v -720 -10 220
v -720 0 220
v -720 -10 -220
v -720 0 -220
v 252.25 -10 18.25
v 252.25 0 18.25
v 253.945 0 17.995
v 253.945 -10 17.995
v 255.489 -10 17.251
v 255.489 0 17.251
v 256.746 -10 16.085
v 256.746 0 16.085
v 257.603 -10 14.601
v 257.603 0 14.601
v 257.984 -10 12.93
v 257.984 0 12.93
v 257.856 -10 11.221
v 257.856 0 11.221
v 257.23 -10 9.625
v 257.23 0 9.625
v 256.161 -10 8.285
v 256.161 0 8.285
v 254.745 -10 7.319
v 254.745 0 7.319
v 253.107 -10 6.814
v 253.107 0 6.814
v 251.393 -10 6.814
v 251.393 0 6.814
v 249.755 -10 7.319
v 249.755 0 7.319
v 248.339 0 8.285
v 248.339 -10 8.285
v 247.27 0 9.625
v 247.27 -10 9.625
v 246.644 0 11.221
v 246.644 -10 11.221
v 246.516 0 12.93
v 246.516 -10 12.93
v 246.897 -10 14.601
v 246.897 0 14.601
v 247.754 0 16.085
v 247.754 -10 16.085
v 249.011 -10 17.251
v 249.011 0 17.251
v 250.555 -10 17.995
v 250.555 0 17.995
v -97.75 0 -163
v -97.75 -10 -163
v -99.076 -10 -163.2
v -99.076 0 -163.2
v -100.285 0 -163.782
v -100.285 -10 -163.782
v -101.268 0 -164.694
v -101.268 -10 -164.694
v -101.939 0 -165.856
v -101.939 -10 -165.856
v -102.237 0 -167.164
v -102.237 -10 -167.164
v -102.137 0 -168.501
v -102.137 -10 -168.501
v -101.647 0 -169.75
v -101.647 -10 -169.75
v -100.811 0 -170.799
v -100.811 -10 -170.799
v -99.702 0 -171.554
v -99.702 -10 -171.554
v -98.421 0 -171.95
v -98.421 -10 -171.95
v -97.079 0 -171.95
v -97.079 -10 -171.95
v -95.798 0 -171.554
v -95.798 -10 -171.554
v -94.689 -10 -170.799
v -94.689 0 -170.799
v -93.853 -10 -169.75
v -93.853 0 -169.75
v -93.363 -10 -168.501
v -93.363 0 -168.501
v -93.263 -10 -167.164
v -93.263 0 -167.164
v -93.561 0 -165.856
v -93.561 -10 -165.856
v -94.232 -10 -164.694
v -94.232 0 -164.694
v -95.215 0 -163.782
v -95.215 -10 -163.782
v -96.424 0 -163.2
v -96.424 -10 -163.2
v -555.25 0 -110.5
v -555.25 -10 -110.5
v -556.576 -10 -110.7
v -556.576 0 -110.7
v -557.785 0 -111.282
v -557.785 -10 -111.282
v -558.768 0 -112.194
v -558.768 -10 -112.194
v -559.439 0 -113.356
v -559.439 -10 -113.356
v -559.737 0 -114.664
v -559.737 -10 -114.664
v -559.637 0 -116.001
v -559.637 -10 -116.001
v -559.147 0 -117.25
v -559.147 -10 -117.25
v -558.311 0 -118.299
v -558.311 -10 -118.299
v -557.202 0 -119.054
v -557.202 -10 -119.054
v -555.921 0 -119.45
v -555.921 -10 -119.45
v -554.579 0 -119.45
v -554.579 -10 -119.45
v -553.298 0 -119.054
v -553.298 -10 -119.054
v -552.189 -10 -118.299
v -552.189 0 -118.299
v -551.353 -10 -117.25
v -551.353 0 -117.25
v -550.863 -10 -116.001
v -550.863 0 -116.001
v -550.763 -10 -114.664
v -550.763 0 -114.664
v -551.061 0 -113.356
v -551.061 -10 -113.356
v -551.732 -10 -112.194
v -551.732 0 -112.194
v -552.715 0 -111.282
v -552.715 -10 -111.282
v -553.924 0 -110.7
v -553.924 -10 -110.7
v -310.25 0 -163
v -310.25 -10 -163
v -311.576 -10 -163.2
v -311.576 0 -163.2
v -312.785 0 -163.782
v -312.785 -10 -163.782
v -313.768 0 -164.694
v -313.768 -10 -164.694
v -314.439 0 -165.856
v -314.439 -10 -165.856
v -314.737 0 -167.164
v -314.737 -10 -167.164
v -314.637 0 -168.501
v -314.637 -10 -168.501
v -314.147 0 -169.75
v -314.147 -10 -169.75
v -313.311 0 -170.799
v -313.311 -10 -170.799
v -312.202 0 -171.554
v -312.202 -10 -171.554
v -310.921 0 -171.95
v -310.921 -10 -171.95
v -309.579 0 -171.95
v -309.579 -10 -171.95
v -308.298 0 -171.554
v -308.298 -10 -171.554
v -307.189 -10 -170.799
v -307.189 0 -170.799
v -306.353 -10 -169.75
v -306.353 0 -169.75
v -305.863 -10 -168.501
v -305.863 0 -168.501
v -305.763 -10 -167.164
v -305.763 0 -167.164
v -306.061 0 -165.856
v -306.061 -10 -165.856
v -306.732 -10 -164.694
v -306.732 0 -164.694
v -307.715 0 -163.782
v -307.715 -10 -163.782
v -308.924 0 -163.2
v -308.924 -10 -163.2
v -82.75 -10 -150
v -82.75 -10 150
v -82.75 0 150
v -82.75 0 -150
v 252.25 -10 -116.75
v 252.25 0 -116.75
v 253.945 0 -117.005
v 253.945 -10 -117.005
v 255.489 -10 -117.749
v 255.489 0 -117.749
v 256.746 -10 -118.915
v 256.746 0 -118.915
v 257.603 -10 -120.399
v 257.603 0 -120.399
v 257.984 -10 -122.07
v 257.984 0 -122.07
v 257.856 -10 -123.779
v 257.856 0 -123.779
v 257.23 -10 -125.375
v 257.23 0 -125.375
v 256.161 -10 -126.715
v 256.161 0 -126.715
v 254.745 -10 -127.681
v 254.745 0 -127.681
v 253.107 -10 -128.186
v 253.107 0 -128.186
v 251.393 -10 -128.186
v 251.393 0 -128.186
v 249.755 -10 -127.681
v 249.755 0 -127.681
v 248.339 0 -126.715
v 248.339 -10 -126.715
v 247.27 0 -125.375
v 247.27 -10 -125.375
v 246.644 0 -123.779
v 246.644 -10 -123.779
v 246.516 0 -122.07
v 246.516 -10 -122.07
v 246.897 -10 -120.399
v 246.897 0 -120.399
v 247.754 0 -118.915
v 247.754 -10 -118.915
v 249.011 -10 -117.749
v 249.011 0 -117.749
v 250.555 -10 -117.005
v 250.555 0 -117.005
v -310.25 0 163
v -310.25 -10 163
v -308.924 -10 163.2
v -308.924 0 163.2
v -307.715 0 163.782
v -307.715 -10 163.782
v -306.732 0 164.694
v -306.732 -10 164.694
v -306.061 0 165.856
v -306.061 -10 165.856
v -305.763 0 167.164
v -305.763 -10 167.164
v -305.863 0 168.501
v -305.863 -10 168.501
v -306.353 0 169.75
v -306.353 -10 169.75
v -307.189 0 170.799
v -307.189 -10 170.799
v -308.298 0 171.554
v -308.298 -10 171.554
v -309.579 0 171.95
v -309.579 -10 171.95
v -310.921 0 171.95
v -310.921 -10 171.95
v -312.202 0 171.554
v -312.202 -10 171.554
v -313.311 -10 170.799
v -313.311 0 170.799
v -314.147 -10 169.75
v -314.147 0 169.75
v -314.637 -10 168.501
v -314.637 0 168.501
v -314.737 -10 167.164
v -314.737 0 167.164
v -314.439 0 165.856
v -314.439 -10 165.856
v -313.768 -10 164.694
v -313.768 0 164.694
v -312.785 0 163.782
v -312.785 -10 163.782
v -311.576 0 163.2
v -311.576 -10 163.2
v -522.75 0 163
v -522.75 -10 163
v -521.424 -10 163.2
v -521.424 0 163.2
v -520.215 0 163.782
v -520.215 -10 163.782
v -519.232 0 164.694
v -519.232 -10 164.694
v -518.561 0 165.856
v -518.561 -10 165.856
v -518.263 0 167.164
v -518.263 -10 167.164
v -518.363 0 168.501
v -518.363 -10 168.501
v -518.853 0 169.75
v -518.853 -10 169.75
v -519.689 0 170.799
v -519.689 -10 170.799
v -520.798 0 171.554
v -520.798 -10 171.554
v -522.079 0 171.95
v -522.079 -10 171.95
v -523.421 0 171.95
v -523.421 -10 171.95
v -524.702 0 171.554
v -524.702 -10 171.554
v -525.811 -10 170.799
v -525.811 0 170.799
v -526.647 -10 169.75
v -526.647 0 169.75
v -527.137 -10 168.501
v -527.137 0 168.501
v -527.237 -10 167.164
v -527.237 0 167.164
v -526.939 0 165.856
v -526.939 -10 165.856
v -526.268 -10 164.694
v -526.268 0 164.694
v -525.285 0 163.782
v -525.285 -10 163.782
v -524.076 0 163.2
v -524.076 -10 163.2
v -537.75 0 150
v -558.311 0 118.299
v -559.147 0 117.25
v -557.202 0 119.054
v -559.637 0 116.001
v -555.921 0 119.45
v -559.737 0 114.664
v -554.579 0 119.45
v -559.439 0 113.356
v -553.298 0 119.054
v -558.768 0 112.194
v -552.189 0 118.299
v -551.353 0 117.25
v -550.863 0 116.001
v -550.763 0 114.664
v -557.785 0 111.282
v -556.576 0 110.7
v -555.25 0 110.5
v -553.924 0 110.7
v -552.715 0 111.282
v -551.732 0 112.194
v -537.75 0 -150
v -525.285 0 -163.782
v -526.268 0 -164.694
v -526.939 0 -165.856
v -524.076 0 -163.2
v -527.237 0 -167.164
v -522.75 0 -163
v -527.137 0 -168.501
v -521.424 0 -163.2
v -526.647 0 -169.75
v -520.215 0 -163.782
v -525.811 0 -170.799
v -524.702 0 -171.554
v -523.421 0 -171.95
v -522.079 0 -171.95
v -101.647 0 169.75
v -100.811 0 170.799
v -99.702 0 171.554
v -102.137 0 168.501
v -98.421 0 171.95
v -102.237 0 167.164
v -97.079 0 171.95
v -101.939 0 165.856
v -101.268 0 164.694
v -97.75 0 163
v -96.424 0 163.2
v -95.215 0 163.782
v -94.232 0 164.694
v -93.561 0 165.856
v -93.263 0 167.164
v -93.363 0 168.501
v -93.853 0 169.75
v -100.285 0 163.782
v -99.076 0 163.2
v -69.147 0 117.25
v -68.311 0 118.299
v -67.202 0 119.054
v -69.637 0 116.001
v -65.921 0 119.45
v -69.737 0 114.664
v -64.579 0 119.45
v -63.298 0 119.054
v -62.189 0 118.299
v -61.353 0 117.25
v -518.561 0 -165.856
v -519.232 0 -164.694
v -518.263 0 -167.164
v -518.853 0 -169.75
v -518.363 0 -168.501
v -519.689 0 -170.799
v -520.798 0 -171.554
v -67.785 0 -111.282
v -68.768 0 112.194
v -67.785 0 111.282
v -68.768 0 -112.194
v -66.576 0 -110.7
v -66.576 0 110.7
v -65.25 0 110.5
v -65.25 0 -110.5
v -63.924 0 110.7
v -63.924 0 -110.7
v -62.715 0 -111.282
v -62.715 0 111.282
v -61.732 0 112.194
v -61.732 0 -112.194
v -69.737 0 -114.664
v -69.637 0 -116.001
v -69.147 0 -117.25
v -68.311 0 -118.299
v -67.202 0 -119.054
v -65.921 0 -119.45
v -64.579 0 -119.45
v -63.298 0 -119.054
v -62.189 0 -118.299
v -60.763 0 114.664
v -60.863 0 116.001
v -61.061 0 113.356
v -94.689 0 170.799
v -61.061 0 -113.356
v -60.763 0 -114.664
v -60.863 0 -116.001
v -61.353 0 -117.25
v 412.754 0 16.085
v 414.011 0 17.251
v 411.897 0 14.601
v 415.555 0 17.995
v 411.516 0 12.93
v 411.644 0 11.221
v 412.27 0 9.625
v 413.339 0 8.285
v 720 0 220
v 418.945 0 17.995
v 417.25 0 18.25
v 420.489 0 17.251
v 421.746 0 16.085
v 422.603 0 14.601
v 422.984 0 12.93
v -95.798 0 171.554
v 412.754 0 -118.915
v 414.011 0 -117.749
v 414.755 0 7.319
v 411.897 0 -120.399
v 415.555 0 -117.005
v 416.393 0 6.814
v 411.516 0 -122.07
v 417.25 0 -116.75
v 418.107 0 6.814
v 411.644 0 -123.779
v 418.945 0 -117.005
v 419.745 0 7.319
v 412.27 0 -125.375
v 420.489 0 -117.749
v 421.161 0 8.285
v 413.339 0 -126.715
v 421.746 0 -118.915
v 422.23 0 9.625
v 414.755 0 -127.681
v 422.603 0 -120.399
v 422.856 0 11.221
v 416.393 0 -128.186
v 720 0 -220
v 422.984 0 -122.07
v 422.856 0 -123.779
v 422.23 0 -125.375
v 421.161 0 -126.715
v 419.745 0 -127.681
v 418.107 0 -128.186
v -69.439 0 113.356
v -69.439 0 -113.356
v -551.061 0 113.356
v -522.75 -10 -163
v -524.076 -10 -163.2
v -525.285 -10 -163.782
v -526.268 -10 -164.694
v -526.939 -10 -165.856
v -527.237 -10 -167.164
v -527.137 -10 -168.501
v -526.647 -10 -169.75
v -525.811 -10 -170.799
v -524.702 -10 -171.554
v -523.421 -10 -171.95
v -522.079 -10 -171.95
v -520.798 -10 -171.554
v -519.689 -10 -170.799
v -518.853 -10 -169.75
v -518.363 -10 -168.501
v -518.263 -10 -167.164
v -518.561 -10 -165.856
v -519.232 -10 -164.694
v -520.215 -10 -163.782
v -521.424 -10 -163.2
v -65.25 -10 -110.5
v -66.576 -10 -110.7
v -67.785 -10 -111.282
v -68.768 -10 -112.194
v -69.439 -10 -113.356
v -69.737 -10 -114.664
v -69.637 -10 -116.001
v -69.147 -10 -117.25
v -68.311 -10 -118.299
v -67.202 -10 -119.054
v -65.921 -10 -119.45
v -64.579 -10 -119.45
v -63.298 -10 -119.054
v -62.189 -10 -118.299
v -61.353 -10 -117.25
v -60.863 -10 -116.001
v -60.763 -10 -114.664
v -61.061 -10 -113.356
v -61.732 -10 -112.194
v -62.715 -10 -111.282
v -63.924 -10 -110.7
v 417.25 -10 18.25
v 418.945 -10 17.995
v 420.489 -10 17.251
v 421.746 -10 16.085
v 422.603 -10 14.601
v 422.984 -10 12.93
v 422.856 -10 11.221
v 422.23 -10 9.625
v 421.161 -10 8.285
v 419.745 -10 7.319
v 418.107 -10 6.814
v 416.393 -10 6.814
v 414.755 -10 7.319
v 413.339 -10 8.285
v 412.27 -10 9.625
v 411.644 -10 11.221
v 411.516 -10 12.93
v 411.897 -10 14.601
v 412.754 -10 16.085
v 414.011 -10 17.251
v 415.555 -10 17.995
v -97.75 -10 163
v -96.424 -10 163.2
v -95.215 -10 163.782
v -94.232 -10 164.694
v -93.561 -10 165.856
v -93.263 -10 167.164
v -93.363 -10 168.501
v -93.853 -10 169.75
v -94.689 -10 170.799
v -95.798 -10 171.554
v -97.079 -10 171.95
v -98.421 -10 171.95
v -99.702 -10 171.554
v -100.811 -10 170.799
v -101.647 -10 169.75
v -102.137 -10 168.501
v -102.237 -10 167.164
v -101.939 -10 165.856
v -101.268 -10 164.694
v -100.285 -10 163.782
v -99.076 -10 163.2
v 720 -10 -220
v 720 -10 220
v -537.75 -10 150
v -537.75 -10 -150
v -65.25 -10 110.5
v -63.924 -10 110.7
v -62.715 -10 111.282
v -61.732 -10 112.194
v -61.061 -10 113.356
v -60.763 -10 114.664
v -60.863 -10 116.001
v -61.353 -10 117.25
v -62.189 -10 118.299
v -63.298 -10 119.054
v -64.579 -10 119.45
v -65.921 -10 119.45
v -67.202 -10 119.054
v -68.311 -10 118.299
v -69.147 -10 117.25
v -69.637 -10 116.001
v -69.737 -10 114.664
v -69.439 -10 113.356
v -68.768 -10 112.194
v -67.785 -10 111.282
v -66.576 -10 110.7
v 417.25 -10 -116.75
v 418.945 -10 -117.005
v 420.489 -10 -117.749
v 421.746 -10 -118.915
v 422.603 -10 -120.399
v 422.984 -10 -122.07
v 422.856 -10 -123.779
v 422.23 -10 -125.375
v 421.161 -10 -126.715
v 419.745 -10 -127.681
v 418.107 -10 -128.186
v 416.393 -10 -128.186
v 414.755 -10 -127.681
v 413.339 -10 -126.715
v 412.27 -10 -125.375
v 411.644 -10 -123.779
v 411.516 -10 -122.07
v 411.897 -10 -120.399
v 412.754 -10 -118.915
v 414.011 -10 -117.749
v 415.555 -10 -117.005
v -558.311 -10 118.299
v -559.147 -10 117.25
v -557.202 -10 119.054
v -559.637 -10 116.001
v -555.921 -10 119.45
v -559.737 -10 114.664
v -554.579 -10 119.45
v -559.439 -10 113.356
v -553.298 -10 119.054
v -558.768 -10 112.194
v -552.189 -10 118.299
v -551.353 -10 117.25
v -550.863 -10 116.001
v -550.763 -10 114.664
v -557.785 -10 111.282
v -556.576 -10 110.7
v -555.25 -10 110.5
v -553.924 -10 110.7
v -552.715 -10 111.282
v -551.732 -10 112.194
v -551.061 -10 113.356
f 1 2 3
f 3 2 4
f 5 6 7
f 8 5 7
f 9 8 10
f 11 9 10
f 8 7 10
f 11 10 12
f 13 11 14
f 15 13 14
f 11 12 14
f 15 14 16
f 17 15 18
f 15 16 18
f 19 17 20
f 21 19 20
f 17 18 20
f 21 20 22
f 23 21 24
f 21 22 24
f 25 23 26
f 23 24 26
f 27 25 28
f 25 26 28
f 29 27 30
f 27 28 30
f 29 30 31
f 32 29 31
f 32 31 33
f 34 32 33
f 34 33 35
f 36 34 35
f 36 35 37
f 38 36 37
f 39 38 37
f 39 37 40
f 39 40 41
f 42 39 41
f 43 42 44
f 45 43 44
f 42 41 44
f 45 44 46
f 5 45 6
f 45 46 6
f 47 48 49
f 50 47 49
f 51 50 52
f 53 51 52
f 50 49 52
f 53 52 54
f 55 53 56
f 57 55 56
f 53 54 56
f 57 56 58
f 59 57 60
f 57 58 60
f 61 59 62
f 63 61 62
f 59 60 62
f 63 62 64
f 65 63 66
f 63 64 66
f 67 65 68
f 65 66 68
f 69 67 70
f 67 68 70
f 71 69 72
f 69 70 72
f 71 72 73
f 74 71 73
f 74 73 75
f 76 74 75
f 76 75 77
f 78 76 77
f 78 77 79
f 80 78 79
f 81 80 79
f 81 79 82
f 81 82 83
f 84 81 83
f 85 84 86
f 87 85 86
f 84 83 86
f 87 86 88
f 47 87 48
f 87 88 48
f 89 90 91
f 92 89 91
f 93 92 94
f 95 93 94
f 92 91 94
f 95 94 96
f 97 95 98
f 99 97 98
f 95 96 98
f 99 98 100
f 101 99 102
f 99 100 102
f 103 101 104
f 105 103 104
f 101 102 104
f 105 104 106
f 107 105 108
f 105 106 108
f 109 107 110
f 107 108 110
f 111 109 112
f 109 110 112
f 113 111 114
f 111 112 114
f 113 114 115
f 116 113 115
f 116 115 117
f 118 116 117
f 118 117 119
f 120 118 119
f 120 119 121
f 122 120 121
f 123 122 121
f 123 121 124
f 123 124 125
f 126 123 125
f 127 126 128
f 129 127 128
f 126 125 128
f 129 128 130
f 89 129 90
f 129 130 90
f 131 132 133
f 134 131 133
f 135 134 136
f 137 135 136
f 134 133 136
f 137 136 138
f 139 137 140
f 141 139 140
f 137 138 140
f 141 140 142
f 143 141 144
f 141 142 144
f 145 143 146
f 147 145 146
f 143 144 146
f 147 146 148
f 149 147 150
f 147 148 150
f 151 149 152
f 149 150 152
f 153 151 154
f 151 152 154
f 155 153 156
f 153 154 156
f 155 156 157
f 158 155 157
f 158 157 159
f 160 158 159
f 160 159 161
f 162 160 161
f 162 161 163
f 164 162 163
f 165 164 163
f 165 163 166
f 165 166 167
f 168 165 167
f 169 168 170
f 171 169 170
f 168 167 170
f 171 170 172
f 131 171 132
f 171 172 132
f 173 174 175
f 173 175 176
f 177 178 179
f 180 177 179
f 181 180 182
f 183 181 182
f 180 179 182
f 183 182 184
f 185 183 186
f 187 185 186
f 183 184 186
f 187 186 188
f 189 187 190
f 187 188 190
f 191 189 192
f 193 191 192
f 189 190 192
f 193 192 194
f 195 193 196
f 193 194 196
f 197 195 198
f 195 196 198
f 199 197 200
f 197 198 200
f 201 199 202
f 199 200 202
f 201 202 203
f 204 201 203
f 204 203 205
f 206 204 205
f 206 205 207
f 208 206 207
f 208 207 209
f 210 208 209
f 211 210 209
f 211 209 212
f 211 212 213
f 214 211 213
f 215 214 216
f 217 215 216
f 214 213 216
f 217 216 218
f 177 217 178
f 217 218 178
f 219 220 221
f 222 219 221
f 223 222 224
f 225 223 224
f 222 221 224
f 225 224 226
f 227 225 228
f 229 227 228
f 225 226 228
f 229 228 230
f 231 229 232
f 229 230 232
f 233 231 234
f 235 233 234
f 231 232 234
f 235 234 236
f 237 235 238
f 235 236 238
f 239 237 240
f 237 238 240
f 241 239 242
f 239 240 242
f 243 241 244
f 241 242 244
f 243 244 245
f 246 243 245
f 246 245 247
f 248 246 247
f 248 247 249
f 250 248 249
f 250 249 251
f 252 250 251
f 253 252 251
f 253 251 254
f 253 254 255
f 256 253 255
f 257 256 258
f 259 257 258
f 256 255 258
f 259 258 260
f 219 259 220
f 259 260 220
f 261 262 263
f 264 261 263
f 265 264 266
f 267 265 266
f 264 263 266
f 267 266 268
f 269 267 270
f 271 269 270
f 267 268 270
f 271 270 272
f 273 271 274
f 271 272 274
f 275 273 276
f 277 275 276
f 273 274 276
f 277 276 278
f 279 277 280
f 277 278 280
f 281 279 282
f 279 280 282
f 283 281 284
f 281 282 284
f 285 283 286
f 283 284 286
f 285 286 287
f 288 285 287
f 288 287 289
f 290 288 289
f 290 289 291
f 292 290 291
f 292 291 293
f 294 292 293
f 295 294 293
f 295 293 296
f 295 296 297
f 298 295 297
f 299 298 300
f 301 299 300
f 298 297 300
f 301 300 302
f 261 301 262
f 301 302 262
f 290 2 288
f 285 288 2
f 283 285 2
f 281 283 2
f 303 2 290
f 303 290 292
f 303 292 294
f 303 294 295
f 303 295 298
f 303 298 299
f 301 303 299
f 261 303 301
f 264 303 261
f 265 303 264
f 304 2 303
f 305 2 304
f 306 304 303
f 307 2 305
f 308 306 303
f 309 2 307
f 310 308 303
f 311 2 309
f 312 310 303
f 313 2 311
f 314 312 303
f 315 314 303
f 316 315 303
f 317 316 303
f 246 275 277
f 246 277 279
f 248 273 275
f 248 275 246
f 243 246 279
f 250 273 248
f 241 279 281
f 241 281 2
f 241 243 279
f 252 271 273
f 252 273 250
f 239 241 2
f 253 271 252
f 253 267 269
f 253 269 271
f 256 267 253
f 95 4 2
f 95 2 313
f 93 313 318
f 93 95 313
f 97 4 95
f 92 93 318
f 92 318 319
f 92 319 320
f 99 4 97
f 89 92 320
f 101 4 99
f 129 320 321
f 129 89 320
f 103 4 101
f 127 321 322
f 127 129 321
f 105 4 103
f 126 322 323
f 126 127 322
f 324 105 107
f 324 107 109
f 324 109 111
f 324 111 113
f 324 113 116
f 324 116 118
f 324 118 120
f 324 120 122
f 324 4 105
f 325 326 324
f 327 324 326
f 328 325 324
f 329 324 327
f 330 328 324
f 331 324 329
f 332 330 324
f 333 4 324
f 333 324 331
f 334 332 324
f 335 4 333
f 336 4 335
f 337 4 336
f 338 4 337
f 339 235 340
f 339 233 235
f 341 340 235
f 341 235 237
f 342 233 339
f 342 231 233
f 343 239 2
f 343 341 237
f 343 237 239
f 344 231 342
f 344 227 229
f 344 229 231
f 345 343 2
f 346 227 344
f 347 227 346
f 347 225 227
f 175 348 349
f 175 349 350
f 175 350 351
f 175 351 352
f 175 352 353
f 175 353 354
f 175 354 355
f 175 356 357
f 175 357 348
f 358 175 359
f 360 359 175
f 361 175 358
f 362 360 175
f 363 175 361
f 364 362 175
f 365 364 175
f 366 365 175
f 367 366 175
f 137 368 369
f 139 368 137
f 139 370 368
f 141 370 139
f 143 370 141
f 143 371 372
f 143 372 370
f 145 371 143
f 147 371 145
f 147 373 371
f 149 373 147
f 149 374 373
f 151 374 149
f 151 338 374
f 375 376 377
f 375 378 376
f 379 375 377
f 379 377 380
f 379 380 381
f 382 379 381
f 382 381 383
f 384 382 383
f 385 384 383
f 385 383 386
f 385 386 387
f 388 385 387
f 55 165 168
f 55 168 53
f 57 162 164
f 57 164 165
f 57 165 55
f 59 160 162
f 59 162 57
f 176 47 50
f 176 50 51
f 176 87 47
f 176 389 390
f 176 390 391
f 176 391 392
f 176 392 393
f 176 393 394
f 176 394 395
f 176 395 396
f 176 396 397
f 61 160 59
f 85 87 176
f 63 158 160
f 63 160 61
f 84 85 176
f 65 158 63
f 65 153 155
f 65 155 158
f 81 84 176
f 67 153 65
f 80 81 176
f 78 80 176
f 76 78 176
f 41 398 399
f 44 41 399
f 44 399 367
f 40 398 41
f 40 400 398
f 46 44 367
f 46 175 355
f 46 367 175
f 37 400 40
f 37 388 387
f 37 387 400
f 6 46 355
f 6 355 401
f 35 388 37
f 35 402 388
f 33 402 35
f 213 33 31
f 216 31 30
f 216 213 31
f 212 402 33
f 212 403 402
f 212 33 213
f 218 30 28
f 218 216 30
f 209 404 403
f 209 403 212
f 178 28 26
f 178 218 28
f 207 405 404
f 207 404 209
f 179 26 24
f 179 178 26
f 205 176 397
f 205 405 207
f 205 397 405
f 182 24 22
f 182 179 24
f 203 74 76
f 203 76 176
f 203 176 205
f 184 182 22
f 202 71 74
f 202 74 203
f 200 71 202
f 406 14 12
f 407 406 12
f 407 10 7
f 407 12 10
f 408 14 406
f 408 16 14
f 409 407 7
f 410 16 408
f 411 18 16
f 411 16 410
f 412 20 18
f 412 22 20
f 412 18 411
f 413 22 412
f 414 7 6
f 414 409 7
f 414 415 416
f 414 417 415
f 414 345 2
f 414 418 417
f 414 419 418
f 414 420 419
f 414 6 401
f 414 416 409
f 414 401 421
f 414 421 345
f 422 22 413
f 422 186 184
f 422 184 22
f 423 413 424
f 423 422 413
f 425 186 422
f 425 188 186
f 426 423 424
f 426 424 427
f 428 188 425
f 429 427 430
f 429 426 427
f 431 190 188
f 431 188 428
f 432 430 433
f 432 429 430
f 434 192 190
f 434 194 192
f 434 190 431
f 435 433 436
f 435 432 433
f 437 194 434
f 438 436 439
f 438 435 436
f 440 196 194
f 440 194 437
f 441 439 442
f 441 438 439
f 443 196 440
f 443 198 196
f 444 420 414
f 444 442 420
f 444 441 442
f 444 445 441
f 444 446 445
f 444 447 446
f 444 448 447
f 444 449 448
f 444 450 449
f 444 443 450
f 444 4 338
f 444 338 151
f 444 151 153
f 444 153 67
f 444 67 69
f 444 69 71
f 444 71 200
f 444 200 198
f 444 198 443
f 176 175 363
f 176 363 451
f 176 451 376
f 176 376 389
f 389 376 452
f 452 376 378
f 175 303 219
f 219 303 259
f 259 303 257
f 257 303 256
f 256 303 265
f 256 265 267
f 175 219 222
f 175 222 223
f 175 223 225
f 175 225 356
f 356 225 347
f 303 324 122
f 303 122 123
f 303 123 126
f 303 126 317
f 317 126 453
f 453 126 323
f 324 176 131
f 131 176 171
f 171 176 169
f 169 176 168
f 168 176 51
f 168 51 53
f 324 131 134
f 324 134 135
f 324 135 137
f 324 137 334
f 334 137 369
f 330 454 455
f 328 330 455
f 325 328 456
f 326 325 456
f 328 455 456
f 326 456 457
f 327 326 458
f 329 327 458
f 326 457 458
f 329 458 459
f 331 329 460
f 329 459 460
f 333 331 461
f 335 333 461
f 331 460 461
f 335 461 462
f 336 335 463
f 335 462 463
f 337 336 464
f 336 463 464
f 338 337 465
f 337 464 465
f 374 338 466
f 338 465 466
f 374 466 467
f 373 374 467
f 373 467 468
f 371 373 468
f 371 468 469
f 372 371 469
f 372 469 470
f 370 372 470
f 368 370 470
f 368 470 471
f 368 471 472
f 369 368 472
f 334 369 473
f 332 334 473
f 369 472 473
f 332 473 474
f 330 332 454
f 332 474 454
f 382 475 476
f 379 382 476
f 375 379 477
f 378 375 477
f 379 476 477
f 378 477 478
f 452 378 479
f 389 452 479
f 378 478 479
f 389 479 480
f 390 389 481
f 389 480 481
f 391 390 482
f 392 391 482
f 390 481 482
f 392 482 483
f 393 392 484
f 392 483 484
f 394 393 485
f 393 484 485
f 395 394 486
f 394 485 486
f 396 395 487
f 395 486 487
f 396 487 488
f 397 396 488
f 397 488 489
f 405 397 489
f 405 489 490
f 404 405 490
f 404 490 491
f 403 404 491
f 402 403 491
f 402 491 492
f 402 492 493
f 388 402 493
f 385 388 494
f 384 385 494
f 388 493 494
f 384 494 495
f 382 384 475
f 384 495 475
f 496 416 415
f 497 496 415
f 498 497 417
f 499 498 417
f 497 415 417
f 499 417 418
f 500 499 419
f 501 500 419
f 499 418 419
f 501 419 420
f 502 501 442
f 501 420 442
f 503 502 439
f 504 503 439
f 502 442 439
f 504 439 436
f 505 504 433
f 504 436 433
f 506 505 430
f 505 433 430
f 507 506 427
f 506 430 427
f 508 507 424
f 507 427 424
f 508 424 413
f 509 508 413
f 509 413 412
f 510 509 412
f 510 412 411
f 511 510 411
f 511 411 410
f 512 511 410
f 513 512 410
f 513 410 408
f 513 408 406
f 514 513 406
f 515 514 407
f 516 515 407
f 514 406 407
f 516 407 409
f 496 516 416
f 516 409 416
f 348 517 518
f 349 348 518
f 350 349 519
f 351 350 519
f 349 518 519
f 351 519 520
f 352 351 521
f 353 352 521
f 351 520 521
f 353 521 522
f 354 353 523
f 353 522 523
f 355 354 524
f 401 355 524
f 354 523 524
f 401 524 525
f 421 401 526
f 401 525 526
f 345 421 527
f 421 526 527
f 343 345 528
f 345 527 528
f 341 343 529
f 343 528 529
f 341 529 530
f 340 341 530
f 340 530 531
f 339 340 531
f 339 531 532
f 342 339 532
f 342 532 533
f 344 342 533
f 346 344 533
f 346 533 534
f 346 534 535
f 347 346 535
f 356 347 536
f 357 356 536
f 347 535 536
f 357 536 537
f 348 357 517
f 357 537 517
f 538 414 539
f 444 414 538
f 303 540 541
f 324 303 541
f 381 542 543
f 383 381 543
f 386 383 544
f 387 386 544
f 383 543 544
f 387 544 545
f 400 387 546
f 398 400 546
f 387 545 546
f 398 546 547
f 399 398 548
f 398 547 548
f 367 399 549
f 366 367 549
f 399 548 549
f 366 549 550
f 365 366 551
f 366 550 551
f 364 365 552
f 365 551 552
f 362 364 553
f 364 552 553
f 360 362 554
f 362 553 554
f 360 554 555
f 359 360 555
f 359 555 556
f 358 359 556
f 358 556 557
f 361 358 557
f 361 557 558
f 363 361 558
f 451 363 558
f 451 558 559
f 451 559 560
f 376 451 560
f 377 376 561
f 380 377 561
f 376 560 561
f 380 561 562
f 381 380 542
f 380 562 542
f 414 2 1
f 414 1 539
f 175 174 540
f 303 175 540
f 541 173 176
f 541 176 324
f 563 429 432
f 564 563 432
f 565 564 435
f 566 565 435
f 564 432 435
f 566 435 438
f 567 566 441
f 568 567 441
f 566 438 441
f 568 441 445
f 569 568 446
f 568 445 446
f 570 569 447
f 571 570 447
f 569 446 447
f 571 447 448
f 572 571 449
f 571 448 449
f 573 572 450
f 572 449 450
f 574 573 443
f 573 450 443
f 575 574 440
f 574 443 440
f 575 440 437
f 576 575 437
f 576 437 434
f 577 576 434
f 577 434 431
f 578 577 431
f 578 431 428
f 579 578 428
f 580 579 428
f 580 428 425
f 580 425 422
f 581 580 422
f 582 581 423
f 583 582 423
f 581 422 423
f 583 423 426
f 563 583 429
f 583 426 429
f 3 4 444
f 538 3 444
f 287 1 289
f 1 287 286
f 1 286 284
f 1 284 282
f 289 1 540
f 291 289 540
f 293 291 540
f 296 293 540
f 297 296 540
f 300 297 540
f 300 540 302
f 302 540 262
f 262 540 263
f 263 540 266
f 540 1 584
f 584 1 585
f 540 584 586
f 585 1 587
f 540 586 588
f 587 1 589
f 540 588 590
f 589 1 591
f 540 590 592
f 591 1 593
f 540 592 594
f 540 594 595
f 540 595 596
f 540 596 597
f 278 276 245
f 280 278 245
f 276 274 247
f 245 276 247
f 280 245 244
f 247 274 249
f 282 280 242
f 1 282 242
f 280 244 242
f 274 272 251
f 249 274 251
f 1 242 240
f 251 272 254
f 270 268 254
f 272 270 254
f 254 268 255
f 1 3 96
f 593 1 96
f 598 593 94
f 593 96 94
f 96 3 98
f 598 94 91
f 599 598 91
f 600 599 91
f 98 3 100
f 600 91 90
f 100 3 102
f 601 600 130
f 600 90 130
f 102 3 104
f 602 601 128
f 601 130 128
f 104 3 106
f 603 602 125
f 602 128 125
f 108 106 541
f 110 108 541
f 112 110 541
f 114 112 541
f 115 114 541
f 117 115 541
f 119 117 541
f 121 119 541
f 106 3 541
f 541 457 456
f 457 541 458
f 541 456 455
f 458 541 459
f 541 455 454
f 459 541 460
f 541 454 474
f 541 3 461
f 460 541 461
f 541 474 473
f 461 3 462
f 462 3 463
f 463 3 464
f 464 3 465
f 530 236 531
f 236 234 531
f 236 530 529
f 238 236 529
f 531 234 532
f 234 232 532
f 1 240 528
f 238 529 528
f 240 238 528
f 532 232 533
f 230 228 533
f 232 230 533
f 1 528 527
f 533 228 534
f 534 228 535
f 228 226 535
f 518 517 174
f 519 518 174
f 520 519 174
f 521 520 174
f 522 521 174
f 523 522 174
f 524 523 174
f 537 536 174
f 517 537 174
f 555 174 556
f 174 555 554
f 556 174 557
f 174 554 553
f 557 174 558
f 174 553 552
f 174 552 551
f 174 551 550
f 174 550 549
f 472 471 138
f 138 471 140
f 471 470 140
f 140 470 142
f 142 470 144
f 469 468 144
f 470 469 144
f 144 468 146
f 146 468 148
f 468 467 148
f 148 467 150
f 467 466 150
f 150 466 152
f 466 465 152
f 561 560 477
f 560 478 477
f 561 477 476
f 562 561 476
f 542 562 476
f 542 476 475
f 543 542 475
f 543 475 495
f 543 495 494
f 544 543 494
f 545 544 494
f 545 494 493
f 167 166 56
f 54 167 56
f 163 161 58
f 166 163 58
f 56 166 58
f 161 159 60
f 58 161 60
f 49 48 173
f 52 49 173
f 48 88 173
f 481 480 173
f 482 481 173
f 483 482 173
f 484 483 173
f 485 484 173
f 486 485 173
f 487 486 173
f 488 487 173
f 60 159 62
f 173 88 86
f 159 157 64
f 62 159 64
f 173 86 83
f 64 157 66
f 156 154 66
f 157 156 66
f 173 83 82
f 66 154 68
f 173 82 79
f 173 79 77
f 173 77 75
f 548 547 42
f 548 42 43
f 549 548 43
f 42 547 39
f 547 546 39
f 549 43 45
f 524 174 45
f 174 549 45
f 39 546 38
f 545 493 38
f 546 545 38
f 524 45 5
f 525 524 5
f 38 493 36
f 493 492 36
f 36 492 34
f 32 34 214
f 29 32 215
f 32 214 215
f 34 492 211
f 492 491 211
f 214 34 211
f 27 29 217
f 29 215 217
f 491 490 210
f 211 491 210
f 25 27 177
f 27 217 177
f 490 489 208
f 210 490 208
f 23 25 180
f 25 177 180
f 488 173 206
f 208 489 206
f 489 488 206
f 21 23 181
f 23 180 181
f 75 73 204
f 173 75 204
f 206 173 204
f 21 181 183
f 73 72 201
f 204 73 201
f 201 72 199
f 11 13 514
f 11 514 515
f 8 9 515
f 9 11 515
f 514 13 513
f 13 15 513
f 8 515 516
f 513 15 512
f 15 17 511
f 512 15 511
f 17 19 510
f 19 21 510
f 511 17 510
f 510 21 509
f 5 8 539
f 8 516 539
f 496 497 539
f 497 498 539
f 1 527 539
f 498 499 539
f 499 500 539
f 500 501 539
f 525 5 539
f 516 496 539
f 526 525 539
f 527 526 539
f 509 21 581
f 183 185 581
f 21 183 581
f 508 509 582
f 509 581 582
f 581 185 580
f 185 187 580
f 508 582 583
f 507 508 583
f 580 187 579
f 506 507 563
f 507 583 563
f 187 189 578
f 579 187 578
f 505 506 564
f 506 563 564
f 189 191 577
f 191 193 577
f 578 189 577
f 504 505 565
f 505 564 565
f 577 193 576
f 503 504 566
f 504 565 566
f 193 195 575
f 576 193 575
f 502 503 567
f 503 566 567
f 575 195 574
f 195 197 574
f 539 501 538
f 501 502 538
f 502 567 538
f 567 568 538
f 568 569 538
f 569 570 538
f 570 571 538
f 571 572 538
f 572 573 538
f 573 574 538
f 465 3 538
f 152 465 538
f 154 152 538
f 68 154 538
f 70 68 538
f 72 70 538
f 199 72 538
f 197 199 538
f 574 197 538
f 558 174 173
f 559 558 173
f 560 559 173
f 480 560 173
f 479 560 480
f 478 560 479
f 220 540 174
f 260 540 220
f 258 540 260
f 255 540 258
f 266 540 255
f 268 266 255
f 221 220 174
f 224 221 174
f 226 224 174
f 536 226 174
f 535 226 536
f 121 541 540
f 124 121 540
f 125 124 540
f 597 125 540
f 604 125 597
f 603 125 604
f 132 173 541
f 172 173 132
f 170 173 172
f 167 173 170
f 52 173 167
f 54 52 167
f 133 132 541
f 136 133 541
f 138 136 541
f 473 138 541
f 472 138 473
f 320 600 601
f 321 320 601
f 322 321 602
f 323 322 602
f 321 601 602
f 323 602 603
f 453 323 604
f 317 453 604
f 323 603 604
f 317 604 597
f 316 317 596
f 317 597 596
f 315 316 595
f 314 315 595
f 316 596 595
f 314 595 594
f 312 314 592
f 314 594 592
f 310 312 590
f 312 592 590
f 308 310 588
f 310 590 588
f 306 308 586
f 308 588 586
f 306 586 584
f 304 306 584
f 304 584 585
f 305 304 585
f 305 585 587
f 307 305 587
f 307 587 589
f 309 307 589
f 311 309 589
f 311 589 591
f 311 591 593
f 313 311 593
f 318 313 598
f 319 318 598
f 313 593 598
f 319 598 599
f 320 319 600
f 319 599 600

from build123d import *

# Parameters (mm, degrees)
IZIM1_W               = 1440
IZIM1_H               = 440
TABAN_FLAN_1_DEPTH    = 10
IZIM2_W               = 455
IZIM2_H               = 300
KES_EKSTR_ZYON1_DEPTH = 10
IZIM4_R               = 4.5
KES_EKSTR_ZYON4_DEPTH = 10
IZIM5_R               = 5.75
KES_EKSTR_ZYON5_DEPTH = 10


# Sheet-metal steps are written as plain solids
with BuildPart() as part:
    # Çizim1 → Taban-Flanş1 (new body)
    with BuildSketch(Plane(origin=(0, 0, 0), x_dir=(1, 0, 0), z_dir=(0, 1, 0))):
        Rectangle(IZIM1_W, IZIM1_H)
    extrude(amount=-TABAN_FLAN_1_DEPTH)

    # Çizim2 → Kes-Ekstrüzyon1 (cut)
    with BuildSketch(Plane(origin=(0, -10, 0), x_dir=(-1, 0, 0), z_dir=(0, -1, 0))):
        with Locations((310.25, 0)):
            Rectangle(IZIM2_W, IZIM2_H)
    extrude(amount=-KES_EKSTR_ZYON1_DEPTH, mode=Mode.SUBTRACT)

    # Çizim4 → Kes-Ekstrüzyon4 (cut)
    with BuildSketch(Plane(origin=(0, -10, 0), x_dir=(-1, 0, 0), z_dir=(0, -1, 0))):
        with Locations(Location((555.25, -115, 0), (0, 0, 90))):
            Circle(IZIM4_R)
        with Locations(Location((522.75, -167.5, 0), (0, 0, 90))):
            Circle(IZIM4_R)
        with Locations(Location((310.25, -167.5, 0), (0, 0, 90))):
            Circle(IZIM4_R)
        with Locations(Location((97.75, -167.5, 0), (0, 0, 90))):
            Circle(IZIM4_R)
        with Locations(Location((65.25, -115, 0), (0, 0, 90))):
            Circle(IZIM4_R)
        with Locations(Location((65.25, 115, 0), (0, 0, 270))):
            Circle(IZIM4_R)
        with Locations(Location((97.75, 167.5, 0), (0, 0, 270))):
            Circle(IZIM4_R)
        with Locations(Location((310.25, 167.5, 0), (0, 0, 270))):
            Circle(IZIM4_R)
        with Locations(Location((522.75, 167.5, 0), (0, 0, 270))):
            Circle(IZIM4_R)
        with Locations(Location((555.25, 115, 0), (0, 0, 270))):
            Circle(IZIM4_R)
    extrude(amount=-KES_EKSTR_ZYON4_DEPTH, mode=Mode.SUBTRACT)

    # Çizim5 → Kes-Ekstrüzyon5 (cut)
    with BuildSketch(Plane(origin=(0, 0, 0), x_dir=(1, 0, 0), z_dir=(0, 1, 0))):
        with Locations(Location((252.25, -12.5, 0), (0, 0, 270))):
            Circle(IZIM5_R)
        with Locations(Location((252.25, 122.5, 0), (0, 0, 270))):
            Circle(IZIM5_R)
        with Locations(Location((417.25, 122.5, 0), (0, 0, 270))):
            Circle(IZIM5_R)
        with Locations(Location((417.25, -12.5, 0), (0, 0, 270))):
            Circle(IZIM5_R)
    extrude(amount=-KES_EKSTR_ZYON5_DEPTH, mode=Mode.SUBTRACT)


solid = part.part
